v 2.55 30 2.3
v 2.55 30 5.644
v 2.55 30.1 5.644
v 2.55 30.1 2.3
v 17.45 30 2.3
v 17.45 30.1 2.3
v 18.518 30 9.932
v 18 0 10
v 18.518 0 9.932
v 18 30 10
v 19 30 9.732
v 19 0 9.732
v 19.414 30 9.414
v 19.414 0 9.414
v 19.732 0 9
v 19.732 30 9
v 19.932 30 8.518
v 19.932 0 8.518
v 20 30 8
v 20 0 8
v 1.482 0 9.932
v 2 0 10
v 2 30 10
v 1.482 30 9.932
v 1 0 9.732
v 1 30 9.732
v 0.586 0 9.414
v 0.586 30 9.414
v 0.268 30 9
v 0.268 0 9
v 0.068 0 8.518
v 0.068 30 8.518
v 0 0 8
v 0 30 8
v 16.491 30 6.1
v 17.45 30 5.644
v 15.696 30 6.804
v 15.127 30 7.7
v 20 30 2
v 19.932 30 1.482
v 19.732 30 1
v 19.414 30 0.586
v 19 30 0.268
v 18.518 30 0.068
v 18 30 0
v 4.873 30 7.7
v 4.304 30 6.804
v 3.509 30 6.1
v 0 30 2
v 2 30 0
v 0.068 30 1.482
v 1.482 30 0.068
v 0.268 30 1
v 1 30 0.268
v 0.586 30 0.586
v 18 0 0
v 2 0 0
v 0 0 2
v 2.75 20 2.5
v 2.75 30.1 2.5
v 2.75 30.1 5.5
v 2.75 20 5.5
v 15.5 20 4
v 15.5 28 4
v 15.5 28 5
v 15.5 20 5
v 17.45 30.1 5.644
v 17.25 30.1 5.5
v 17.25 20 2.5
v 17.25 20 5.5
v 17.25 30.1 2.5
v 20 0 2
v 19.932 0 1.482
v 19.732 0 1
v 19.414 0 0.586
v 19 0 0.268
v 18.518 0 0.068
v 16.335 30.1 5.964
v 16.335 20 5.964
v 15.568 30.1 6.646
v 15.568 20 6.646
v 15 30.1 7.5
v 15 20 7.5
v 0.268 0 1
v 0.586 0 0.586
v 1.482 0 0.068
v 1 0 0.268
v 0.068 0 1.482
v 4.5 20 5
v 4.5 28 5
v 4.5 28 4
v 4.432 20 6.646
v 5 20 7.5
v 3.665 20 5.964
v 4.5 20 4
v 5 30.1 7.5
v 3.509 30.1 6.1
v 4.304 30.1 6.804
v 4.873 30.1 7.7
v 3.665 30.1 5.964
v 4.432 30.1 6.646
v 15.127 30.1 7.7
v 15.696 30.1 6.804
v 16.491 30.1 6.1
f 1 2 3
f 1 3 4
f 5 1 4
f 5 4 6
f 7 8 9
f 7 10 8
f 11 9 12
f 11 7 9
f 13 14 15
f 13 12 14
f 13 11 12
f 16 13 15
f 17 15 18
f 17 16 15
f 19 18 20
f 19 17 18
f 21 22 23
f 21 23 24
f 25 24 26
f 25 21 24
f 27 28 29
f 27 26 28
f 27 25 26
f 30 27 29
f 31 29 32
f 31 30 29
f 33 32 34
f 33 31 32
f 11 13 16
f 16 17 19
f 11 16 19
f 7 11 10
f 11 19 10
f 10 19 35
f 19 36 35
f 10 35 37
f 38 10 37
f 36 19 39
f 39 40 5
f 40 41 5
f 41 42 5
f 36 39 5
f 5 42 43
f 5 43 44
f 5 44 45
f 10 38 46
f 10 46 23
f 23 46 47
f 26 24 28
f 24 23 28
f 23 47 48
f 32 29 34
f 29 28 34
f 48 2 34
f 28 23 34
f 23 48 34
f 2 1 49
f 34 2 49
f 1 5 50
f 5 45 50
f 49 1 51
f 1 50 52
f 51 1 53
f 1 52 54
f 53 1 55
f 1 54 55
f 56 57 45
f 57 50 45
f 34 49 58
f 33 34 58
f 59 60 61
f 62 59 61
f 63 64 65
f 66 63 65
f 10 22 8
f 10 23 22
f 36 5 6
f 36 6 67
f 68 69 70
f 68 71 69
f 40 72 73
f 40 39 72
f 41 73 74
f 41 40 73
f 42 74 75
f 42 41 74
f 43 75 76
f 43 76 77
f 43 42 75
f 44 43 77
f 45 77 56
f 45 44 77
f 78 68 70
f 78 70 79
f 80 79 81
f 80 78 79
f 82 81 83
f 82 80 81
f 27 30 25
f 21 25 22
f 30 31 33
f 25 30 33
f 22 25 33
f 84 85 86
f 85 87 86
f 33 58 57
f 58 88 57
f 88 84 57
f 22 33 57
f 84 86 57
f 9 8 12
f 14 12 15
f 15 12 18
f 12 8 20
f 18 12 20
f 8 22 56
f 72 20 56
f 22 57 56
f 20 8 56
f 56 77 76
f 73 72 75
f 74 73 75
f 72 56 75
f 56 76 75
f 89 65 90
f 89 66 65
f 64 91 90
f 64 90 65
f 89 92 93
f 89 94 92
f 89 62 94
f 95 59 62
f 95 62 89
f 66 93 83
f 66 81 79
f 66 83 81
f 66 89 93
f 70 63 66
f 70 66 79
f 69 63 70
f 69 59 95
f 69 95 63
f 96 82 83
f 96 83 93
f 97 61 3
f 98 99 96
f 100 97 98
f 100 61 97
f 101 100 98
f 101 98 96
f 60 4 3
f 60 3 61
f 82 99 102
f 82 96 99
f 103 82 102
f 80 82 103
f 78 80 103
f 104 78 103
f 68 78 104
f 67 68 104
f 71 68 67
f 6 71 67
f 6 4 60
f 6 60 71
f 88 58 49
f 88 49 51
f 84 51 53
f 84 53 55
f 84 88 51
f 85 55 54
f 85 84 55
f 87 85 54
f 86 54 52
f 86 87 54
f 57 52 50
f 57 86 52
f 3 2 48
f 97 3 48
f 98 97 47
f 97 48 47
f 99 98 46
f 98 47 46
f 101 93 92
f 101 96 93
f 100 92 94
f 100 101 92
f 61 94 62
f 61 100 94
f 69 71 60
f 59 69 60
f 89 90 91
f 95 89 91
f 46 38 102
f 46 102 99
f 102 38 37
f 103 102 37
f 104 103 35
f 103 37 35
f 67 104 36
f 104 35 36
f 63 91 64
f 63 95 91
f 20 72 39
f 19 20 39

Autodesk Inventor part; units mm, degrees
ref_plane "YZ Plane" through (0, 0, 0) normal (1, 0, 0) x (0, 1, 0)
ref_plane "XZ Plane" through (0, 0, 0) normal (0, 1, 0) x (-1, 0, 0)
ref_plane "XY Plane" through (0, 0, 0) normal (0, 0, 1) x (1, 0, 0)
sketch "Sketch1" plane through (0, 0, 0) normal (0, 0, 1) x (1, 0, 0)
  line L0 (0, 0) -> (20, 0)
  line L1 (20, 0) -> (20, 30)
  line L2 (20, 30) -> (0, 30)
  line L3 (0, 30) -> (0, 0)
  dimension "d0" = 20
  dimension "d1" = 30
extrude "Extrusion1" add sketch "Sketch1" along normal blind 10
fillet "Fillet1" radius 2 4 edges at (0, 15, 10) (20, 15, 10) (20, 15, 0) (0, 15, 0)
sketch "Sketch2" plane through (2, 30, 0) normal (0, 1, 0) x (1, 0, 0)
  line L0 (15.25, -2.5) -> (0.75, -2.5)
  line L1 (0.75, -2.5) -> (0.75, -5.5)
  line L2 (15.25, -2.5) -> (15.25, -5.5)
  line L3 (13, -7.5) -> (3, -7.5)
  line L4 (16, -10) -> (0, -10) projected
  line L5 (8, -2.5) -> (8, -7.5) construction
  line L6 (18, -2) -> (18, -8) projected
  arc A0 (15.25, -5.5) -> (13, -7.5) centre (16.5871, -9.2699) ccw
  arc A1 (3, -7.5) -> (0.75, -5.5) centre (-0.5871, -9.2699) ccw
  point P0 (-2, 0)
  point P1 (8, -10)
  point P2 (8, -5)
  point P3 (18, -5)
  dimension "d5" = 14.5
  dimension "d6" = 3
  dimension "d7" = 2
  dimension "d8" = 10
  dimension "d9" = 4
  dimension "d10" = 4
extrude "Extrusion2" cut sketch "Sketch2" against normal blind 10
sketch "Sketch3" plane through (2, 20, 0) normal (0, 1, 0) x (1, 0, 0)
  line L0 (0.75, -2.5) -> (15.25, -2.5) projected
  line L1 (0.75, -5.5) -> (0.75, -2.5) projected
  arc A0 (3, -7.5) -> (0.75, -5.5) centre (-0.5871, -9.2699) ccw projected
  line L2 (13, -7.5) -> (3, -7.5) projected
  arc A1 (15.25, -5.5) -> (13, -7.5) centre (16.5871, -9.2699) ccw projected
  line L3 (15.25, -2.5) -> (15.25, -5.5) projected
  arc A2 (2.8734, -7.7) -> (0.55, -5.644) centre (-0.5871, -9.2699) ccw
  line L4 (0.55, -5.644) -> (0.55, -2.3)
  line L5 (0.55, -2.3) -> (15.45, -2.3)
  line L6 (15.45, -2.3) -> (15.45, -5.644)
  arc A3 (15.45, -5.644) -> (13.1266, -7.7) centre (16.5871, -9.2699) ccw
  line L7 (13.1266, -7.7) -> (2.8734, -7.7)
  point P0 (-2, 0)
  dimension "d13" = 0.2
extrude "Extrusion3" add sketch "Sketch3" along normal blind 10.1
sketch "Sketch4" plane through (2, 20, 0) normal (0, 1, 0) x (1, 0, 0)
  line L0 (13.5, -5) -> (2.5, -5)
  line L1 (2.5, -5) -> (2.5, -4)
  line L2 (2.5, -4) -> (13.5, -4)
  line L3 (13.5, -4) -> (13.5, -5)
  line L4 (13, -7.5) -> (3, -7.5) projected
  line L5 (0.75, -2.5) -> (15.25, -2.5) projected
  point P0 (-2, 0)
  point P1 (8, -5)
  point P2 (8, -7.5)
  dimension "d16" = 11
  dimension "d17" = 1
  dimension "d18" = 1.5
extrude "Extrusion4" add sketch "Sketch4" along normal blind 8
properties part number "HDMI Port" material "ABS Plastic"
